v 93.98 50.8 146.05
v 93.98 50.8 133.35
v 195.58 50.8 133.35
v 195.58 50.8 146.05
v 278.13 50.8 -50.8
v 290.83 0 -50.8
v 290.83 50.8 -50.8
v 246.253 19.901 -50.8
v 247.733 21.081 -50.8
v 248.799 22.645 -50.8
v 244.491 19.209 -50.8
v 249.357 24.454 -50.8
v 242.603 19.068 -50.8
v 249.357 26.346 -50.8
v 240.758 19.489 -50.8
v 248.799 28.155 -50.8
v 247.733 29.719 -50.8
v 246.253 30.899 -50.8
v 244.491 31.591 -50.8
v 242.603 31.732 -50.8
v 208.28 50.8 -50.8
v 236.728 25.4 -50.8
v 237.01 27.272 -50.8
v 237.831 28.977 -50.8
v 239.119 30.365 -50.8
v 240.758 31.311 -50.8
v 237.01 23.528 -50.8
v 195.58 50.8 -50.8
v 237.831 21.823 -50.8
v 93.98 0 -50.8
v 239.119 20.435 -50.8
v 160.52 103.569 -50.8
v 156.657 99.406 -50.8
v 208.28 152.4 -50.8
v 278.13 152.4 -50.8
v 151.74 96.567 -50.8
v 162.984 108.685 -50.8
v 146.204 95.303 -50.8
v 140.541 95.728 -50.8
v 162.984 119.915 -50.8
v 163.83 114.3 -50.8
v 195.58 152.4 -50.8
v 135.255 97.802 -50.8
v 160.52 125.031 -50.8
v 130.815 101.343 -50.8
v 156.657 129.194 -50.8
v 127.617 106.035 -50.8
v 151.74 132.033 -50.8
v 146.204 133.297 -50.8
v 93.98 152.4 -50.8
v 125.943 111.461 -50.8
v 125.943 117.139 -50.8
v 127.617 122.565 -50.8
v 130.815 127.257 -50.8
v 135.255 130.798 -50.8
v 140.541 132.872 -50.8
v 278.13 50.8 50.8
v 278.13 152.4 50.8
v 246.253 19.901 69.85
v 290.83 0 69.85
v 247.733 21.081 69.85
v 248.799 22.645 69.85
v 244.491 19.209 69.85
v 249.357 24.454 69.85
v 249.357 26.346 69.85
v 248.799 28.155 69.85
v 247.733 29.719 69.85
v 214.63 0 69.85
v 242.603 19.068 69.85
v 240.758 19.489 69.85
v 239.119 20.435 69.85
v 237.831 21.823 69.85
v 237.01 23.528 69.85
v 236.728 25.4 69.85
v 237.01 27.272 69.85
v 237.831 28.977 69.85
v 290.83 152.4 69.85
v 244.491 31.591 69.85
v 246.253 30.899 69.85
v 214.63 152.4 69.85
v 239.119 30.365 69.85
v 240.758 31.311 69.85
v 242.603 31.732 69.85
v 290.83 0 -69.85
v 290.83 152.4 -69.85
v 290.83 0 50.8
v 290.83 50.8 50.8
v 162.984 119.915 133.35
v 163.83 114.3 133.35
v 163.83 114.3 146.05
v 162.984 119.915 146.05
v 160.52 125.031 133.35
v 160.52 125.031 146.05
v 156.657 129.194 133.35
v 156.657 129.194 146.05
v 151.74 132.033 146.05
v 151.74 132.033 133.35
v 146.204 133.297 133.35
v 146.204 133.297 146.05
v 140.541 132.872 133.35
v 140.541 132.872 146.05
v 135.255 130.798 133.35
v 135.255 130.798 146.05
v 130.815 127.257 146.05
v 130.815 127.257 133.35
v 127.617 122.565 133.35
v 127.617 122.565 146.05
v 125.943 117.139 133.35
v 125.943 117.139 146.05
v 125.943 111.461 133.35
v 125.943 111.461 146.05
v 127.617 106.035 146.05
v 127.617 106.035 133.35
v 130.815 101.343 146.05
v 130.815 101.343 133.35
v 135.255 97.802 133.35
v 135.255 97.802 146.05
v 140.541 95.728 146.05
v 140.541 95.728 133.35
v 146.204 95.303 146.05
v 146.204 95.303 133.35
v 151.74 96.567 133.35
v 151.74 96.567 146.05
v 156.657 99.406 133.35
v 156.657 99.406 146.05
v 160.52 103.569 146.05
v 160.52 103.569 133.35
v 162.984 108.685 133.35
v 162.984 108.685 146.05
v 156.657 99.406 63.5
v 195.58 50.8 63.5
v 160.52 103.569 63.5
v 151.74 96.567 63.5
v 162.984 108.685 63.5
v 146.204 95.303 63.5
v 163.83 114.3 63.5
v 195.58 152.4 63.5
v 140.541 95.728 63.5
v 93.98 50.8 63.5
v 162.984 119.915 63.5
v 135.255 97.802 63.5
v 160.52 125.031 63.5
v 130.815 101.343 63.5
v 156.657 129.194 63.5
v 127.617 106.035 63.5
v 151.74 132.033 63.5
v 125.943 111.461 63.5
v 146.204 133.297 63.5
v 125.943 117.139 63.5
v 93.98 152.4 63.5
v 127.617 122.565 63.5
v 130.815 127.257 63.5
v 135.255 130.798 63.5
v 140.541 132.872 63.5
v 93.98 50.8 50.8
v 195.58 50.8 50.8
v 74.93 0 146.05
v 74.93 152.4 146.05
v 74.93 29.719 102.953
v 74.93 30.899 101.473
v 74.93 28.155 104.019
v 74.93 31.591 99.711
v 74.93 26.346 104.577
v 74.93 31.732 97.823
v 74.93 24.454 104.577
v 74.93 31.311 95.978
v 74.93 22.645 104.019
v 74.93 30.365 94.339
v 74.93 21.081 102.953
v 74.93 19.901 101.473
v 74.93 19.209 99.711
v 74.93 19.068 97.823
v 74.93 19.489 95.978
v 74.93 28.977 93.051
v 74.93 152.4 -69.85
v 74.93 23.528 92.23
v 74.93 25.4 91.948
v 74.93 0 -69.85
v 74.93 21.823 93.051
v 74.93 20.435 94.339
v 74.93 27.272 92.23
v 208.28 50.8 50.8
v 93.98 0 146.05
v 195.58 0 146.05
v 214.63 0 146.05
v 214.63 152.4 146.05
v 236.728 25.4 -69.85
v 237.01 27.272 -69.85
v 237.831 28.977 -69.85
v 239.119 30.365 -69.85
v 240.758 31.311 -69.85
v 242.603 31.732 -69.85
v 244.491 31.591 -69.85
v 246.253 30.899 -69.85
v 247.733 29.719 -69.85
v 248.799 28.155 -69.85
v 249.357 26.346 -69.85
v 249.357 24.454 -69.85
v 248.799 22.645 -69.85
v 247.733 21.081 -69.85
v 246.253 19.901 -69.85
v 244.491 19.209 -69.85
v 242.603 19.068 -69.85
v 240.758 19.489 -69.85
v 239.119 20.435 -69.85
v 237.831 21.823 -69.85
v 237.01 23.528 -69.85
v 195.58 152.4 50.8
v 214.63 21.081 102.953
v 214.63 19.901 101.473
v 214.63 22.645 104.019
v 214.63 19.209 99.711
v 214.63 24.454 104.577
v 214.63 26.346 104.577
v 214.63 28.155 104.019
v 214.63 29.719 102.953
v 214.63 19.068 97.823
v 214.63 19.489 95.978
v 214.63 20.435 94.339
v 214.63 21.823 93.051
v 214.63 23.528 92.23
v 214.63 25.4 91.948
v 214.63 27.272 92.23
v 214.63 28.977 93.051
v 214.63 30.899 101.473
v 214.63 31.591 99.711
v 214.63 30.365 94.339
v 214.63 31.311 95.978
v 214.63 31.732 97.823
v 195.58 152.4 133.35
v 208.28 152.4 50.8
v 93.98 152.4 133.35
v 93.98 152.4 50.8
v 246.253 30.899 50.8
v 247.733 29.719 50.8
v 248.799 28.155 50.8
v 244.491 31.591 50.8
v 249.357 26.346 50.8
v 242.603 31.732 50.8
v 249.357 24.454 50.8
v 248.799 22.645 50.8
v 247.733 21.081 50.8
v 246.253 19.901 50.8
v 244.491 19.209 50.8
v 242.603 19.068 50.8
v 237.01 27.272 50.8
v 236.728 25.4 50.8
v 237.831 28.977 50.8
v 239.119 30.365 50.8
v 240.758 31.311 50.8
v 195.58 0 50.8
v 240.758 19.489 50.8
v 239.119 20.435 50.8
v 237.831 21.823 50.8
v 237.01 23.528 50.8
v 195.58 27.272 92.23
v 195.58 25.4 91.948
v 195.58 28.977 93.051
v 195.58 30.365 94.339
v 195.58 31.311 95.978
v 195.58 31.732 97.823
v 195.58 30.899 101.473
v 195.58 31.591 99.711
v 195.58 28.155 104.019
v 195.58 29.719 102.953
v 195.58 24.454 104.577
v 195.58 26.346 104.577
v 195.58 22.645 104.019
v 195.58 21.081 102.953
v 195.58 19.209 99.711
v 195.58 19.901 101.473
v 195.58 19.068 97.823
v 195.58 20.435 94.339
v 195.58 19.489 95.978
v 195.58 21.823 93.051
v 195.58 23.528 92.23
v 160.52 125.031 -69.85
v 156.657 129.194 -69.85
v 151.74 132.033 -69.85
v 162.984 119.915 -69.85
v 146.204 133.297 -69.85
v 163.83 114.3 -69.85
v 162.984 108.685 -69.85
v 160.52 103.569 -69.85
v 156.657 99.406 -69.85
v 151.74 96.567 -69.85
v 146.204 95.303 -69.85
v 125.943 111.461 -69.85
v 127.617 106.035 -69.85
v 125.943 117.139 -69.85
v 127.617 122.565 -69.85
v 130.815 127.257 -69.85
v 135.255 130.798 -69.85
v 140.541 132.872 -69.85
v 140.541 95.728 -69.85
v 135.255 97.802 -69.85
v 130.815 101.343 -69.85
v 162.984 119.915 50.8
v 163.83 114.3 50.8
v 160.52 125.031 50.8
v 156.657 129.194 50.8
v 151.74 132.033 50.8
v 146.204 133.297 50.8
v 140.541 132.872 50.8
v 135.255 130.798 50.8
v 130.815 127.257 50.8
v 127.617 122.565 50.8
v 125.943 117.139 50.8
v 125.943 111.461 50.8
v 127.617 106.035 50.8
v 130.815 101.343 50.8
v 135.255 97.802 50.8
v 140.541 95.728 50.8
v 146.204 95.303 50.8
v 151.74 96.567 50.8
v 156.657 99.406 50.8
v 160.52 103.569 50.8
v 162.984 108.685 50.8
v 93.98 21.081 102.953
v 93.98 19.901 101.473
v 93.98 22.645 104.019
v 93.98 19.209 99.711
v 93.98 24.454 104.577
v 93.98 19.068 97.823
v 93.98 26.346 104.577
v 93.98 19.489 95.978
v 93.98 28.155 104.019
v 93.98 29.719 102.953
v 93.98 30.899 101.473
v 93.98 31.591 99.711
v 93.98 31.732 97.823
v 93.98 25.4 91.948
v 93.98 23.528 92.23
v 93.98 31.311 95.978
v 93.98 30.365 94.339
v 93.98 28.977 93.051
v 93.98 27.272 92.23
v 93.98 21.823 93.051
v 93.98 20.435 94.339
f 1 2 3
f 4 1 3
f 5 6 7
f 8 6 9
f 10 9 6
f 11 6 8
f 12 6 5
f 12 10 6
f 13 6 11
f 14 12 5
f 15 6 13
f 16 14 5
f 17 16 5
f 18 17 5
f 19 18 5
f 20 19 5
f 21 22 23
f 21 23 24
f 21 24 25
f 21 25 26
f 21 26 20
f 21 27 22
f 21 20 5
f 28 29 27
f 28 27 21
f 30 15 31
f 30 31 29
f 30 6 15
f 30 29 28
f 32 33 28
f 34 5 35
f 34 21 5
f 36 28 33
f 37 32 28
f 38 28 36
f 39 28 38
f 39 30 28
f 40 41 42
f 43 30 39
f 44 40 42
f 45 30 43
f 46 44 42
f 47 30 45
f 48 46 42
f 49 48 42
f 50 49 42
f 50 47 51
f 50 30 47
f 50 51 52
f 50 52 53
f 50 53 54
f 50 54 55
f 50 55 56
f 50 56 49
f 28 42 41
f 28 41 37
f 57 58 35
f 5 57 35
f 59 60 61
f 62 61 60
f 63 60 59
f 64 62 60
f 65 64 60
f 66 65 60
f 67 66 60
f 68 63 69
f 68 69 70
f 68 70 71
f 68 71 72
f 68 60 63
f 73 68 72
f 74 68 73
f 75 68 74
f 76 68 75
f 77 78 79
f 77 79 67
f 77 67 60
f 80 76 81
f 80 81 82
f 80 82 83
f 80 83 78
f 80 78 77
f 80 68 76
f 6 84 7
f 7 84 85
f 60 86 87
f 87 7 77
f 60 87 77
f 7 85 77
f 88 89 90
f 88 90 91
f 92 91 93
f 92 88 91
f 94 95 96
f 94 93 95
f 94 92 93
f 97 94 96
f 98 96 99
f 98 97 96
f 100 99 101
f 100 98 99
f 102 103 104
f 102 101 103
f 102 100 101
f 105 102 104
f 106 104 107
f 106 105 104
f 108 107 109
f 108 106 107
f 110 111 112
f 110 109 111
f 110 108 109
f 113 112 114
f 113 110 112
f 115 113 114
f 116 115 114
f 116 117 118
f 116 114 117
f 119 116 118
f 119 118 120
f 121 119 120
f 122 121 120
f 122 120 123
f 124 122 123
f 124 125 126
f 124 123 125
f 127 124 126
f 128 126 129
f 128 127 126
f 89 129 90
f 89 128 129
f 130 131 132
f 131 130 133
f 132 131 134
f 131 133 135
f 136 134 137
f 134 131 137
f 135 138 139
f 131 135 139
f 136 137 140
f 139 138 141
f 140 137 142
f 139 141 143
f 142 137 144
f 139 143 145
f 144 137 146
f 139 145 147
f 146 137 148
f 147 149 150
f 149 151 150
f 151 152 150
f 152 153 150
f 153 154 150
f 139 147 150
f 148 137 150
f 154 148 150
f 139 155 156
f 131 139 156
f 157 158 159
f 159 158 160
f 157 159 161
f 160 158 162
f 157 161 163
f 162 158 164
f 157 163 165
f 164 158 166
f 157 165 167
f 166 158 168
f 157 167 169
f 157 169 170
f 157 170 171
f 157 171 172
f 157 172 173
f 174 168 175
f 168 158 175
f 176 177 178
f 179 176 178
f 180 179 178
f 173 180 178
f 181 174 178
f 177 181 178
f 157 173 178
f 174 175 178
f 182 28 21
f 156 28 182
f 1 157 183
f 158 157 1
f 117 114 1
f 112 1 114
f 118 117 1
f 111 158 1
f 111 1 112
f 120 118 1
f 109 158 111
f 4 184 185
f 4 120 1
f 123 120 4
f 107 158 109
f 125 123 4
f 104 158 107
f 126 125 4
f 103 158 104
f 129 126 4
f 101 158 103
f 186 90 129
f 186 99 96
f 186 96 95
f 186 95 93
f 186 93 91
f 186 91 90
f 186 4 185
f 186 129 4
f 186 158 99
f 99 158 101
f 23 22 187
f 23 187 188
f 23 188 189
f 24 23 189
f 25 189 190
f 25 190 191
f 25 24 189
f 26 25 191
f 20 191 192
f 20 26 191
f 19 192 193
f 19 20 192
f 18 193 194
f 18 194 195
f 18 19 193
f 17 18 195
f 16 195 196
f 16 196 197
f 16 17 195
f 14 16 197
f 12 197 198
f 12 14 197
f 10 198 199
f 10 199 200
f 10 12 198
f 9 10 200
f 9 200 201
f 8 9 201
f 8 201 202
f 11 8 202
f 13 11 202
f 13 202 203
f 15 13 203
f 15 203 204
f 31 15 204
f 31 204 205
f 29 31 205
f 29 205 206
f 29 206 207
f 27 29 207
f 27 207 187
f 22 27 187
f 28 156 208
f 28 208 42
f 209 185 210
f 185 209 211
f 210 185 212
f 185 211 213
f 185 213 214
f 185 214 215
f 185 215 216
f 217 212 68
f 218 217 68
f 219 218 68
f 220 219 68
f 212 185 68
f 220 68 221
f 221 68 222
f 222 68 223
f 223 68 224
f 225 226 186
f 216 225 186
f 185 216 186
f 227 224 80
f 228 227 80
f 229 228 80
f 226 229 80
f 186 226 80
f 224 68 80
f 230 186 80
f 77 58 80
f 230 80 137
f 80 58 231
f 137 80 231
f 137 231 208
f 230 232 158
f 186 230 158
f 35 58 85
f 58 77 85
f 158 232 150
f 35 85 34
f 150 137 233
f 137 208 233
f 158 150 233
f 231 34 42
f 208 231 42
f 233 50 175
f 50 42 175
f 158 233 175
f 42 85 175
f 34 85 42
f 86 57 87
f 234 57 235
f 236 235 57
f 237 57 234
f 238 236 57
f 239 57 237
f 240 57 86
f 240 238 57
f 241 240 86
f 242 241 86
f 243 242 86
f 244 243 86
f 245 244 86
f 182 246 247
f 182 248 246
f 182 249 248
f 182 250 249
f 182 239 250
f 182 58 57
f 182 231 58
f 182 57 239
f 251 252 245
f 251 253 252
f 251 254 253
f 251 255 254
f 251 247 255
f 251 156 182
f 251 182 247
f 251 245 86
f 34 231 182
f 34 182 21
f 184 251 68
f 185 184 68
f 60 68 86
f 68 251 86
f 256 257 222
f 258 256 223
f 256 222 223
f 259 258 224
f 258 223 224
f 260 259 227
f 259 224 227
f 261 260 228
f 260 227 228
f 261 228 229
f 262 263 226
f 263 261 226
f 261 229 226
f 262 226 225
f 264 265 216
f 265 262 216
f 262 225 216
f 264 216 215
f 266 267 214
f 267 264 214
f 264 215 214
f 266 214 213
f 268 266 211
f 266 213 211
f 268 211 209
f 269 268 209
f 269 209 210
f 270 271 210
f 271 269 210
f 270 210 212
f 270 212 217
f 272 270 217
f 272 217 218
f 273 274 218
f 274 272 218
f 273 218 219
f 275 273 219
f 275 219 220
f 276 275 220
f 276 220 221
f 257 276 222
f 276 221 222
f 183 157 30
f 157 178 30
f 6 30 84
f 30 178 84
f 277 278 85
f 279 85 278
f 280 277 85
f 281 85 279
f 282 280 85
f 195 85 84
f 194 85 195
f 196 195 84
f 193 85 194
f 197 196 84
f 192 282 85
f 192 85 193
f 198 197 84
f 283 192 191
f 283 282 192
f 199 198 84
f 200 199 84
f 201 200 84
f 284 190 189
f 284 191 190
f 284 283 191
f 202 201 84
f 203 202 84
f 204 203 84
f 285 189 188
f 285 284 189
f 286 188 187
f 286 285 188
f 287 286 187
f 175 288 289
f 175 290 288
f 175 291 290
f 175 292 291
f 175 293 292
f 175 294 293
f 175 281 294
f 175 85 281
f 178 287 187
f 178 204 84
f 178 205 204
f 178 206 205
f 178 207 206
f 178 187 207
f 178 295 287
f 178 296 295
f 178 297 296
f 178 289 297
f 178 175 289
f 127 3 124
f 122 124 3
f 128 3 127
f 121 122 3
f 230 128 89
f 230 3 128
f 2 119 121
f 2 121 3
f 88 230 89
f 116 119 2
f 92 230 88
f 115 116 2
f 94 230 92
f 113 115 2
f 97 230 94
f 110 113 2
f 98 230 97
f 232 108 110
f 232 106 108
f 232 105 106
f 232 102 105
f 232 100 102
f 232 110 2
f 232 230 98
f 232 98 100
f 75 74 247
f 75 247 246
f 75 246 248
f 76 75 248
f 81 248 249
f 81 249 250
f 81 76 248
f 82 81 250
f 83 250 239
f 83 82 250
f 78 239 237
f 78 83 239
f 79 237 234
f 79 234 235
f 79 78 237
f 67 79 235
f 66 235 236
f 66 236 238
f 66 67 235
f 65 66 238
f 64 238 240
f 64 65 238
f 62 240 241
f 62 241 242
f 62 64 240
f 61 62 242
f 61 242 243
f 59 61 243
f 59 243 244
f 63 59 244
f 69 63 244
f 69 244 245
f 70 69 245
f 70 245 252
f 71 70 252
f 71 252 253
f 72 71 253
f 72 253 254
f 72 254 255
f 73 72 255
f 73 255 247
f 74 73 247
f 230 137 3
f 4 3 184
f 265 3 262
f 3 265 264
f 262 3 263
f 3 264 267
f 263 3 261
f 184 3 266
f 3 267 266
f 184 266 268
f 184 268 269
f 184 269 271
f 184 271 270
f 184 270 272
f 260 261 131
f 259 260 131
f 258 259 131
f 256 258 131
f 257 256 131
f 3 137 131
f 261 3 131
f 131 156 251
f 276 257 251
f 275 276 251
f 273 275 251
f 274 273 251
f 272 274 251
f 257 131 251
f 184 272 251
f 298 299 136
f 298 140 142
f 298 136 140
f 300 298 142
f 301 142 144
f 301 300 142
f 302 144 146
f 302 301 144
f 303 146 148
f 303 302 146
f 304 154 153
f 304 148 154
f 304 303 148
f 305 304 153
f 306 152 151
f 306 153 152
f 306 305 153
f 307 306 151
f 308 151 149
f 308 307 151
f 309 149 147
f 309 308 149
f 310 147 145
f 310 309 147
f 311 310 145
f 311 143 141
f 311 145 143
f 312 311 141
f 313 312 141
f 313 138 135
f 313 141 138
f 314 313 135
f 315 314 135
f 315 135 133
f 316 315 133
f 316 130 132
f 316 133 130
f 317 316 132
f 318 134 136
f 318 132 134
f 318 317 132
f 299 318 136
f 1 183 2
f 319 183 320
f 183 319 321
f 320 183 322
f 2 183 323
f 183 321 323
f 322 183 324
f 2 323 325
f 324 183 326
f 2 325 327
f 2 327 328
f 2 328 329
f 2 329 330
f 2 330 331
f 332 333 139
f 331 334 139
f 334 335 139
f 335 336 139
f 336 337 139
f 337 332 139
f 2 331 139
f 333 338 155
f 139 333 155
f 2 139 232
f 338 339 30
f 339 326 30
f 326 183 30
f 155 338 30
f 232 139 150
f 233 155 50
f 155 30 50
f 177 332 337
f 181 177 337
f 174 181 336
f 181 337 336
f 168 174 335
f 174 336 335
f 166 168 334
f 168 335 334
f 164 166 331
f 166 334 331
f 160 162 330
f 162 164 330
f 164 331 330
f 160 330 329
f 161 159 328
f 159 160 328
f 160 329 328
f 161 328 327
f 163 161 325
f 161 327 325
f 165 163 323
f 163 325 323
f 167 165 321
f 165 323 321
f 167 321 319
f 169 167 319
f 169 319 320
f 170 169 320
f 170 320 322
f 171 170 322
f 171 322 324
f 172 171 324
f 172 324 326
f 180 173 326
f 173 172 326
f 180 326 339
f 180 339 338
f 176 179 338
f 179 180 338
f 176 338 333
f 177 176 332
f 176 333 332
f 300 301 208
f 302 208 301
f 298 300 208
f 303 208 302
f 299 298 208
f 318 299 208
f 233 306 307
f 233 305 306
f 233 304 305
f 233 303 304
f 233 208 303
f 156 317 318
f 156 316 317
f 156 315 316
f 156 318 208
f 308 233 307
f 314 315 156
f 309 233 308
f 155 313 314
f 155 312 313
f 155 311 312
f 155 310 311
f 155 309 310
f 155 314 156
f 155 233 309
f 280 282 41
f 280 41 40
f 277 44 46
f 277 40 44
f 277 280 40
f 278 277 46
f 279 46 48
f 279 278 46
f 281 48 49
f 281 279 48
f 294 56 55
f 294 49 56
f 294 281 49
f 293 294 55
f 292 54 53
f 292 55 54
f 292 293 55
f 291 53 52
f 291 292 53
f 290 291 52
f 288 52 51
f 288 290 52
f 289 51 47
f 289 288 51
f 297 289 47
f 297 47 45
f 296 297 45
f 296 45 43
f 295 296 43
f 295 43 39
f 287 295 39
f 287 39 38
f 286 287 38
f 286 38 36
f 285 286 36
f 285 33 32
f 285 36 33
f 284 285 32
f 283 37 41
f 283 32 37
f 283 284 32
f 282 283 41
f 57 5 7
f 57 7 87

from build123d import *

# Parameters (mm, degrees)
SKETCH1_W               = 139.7
SKETCH1_H               = 139.7
SKETCH1_W_2             = 101.6
SKETCH1_H_2             = 101.6
EXTRUDE_THIN1_DEPTH     = 152.4
CUT_EXTRUDE2_START      = -50.8
SKETCH3_W               = 19.05
SKETCH3_H               = 101.6
CUT_EXTRUDE2_DEPTH      = 50.8
BOSS_EXTRUDE2_DEPTH     = 76.2
SKETCH6_W               = 69.85
SKETCH6_H               = 101.6
CUT_EXTRUDE3_DEPTH      = 223.34069578
SKETCH8_R               = 6.35
CUT_EXTRUDE4_DEPTH      = 254.125369136
SKETCH9_W               = 215.9
SKETCH9_H               = 152.4
CUT_EXTRUDE5_DEPTH      = 304.76371755
CUT_EXTRUDE6_DEPTH      = 355.386895074
CUT_EXTRUDE6_DEPTH_BACK = 355.386895074
SKETCH11_R              = 19.05


with BuildPart() as part:
    # Sketch1 → Extrude-Thin1 (new body)
    with BuildSketch(Plane(origin=(0, 0, 0), x_dir=(1, 0, 0), z_dir=(0, 1, 0))):
        Rectangle(SKETCH1_W, SKETCH1_H)
        Rectangle(SKETCH1_W_2, SKETCH1_H_2, mode=Mode.SUBTRACT)
    extrude(amount=EXTRUDE_THIN1_DEPTH)

    # Sketch3 → Cut-Extrude2 (cut)
    with BuildSketch(Plane.XZ.offset(CUT_EXTRUDE2_START)):
        with Locations((-60.325, 0)):
            Rectangle(SKETCH3_W, SKETCH3_H)
    cut_extrude2 = extrude(amount=CUT_EXTRUDE2_DEPTH, mode=Mode.SUBTRACT)

    # Sketch5 → Boss-Extrude2 (add)
    with BuildSketch(Plane.ZY.offset(69.85)):
        Polygon((-50.8, 50.8), (50.8, 50.8), (50.8, 0), (69.85, 0), (69.85, 152.4), (-69.85, 152.4), (-69.85, 0), (-50.8, 0), align=None)
    boss_extrude2 = extrude(amount=BOSS_EXTRUDE2_DEPTH)

    # Sketch6 → Cut-Extrude3 (cut, through all)
    with BuildSketch(Plane(origin=(0, 152.4, 0), x_dir=(1, 0, 0), z_dir=(0, 1, 0))):
        with Locations((-98.425, 0)):
            Rectangle(SKETCH6_W, SKETCH6_H)
    cut_extrude3 = extrude(amount=-CUT_EXTRUDE3_DEPTH, mode=Mode.SUBTRACT)

    # Sketch8 → Cut-Extrude4 (cut, through all)
    with BuildSketch(Plane.XY.offset(69.85)):
        with Locations((-98.298, 25.4)):
            Circle(SKETCH8_R)
    cut_extrude4 = extrude(amount=-CUT_EXTRUDE4_DEPTH, mode=Mode.SUBTRACT)

    # Mirror3: Cut-Extrude2, Boss-Extrude2, Cut-Extrude3, Cut-Extrude4 across plane
    add(cut_extrude2.mirror(Plane(origin=(0, 0, 0), x_dir=(-0.7071067811865476, 0, 0.7071067811865476), z_dir=(-0.7071067811865477, 0, -0.7071067811865475))), mode=Mode.SUBTRACT)
    add(boss_extrude2.mirror(Plane(origin=(0, 0, 0), x_dir=(-0.7071067811865476, 0, 0.7071067811865476), z_dir=(-0.7071067811865477, 0, -0.7071067811865475))))
    add(cut_extrude3.mirror(Plane(origin=(0, 0, 0), x_dir=(-0.7071067811865476, 0, 0.7071067811865476), z_dir=(-0.7071067811865477, 0, -0.7071067811865475))), mode=Mode.SUBTRACT)
    add(cut_extrude4.mirror(Plane(origin=(0, 0, 0), x_dir=(-0.7071067811865476, 0, 0.7071067811865476), z_dir=(-0.7071067811865477, 0, -0.7071067811865475))), mode=Mode.SUBTRACT)


with BuildPart() as body_2:
    # Mirror5: mirrored copy
    add(part.part.mirror(Plane(origin=(72.39, 0, 0), x_dir=(0, 0, 1), z_dir=(1, 0, 0))))

    # Sketch11 → Cut-Extrude6 (cut, two sides: drawn at the far end of the back side and taken through both)
    with BuildSketch(Plane.XY.offset(63.5).offset(-CUT_EXTRUDE6_DEPTH_BACK)):
        with Locations((144.78, 114.3)):
            Circle(SKETCH11_R)
    extrude(amount=CUT_EXTRUDE6_DEPTH + CUT_EXTRUDE6_DEPTH_BACK, mode=Mode.SUBTRACT)


with BuildPart() as part_1:
    add(part.part)

    # Sketch9 → Cut-Extrude5 (cut, through all)
    with BuildSketch(Plane(origin=(72.39, 0, 0), x_dir=(0, 0, -1), z_dir=(1, 0, 0))):
        with Locations((-38.1, 76.2)):
            Rectangle(SKETCH9_W, SKETCH9_H)
    extrude(amount=-CUT_EXTRUDE5_DEPTH, mode=Mode.SUBTRACT)


solid = body_2.part
